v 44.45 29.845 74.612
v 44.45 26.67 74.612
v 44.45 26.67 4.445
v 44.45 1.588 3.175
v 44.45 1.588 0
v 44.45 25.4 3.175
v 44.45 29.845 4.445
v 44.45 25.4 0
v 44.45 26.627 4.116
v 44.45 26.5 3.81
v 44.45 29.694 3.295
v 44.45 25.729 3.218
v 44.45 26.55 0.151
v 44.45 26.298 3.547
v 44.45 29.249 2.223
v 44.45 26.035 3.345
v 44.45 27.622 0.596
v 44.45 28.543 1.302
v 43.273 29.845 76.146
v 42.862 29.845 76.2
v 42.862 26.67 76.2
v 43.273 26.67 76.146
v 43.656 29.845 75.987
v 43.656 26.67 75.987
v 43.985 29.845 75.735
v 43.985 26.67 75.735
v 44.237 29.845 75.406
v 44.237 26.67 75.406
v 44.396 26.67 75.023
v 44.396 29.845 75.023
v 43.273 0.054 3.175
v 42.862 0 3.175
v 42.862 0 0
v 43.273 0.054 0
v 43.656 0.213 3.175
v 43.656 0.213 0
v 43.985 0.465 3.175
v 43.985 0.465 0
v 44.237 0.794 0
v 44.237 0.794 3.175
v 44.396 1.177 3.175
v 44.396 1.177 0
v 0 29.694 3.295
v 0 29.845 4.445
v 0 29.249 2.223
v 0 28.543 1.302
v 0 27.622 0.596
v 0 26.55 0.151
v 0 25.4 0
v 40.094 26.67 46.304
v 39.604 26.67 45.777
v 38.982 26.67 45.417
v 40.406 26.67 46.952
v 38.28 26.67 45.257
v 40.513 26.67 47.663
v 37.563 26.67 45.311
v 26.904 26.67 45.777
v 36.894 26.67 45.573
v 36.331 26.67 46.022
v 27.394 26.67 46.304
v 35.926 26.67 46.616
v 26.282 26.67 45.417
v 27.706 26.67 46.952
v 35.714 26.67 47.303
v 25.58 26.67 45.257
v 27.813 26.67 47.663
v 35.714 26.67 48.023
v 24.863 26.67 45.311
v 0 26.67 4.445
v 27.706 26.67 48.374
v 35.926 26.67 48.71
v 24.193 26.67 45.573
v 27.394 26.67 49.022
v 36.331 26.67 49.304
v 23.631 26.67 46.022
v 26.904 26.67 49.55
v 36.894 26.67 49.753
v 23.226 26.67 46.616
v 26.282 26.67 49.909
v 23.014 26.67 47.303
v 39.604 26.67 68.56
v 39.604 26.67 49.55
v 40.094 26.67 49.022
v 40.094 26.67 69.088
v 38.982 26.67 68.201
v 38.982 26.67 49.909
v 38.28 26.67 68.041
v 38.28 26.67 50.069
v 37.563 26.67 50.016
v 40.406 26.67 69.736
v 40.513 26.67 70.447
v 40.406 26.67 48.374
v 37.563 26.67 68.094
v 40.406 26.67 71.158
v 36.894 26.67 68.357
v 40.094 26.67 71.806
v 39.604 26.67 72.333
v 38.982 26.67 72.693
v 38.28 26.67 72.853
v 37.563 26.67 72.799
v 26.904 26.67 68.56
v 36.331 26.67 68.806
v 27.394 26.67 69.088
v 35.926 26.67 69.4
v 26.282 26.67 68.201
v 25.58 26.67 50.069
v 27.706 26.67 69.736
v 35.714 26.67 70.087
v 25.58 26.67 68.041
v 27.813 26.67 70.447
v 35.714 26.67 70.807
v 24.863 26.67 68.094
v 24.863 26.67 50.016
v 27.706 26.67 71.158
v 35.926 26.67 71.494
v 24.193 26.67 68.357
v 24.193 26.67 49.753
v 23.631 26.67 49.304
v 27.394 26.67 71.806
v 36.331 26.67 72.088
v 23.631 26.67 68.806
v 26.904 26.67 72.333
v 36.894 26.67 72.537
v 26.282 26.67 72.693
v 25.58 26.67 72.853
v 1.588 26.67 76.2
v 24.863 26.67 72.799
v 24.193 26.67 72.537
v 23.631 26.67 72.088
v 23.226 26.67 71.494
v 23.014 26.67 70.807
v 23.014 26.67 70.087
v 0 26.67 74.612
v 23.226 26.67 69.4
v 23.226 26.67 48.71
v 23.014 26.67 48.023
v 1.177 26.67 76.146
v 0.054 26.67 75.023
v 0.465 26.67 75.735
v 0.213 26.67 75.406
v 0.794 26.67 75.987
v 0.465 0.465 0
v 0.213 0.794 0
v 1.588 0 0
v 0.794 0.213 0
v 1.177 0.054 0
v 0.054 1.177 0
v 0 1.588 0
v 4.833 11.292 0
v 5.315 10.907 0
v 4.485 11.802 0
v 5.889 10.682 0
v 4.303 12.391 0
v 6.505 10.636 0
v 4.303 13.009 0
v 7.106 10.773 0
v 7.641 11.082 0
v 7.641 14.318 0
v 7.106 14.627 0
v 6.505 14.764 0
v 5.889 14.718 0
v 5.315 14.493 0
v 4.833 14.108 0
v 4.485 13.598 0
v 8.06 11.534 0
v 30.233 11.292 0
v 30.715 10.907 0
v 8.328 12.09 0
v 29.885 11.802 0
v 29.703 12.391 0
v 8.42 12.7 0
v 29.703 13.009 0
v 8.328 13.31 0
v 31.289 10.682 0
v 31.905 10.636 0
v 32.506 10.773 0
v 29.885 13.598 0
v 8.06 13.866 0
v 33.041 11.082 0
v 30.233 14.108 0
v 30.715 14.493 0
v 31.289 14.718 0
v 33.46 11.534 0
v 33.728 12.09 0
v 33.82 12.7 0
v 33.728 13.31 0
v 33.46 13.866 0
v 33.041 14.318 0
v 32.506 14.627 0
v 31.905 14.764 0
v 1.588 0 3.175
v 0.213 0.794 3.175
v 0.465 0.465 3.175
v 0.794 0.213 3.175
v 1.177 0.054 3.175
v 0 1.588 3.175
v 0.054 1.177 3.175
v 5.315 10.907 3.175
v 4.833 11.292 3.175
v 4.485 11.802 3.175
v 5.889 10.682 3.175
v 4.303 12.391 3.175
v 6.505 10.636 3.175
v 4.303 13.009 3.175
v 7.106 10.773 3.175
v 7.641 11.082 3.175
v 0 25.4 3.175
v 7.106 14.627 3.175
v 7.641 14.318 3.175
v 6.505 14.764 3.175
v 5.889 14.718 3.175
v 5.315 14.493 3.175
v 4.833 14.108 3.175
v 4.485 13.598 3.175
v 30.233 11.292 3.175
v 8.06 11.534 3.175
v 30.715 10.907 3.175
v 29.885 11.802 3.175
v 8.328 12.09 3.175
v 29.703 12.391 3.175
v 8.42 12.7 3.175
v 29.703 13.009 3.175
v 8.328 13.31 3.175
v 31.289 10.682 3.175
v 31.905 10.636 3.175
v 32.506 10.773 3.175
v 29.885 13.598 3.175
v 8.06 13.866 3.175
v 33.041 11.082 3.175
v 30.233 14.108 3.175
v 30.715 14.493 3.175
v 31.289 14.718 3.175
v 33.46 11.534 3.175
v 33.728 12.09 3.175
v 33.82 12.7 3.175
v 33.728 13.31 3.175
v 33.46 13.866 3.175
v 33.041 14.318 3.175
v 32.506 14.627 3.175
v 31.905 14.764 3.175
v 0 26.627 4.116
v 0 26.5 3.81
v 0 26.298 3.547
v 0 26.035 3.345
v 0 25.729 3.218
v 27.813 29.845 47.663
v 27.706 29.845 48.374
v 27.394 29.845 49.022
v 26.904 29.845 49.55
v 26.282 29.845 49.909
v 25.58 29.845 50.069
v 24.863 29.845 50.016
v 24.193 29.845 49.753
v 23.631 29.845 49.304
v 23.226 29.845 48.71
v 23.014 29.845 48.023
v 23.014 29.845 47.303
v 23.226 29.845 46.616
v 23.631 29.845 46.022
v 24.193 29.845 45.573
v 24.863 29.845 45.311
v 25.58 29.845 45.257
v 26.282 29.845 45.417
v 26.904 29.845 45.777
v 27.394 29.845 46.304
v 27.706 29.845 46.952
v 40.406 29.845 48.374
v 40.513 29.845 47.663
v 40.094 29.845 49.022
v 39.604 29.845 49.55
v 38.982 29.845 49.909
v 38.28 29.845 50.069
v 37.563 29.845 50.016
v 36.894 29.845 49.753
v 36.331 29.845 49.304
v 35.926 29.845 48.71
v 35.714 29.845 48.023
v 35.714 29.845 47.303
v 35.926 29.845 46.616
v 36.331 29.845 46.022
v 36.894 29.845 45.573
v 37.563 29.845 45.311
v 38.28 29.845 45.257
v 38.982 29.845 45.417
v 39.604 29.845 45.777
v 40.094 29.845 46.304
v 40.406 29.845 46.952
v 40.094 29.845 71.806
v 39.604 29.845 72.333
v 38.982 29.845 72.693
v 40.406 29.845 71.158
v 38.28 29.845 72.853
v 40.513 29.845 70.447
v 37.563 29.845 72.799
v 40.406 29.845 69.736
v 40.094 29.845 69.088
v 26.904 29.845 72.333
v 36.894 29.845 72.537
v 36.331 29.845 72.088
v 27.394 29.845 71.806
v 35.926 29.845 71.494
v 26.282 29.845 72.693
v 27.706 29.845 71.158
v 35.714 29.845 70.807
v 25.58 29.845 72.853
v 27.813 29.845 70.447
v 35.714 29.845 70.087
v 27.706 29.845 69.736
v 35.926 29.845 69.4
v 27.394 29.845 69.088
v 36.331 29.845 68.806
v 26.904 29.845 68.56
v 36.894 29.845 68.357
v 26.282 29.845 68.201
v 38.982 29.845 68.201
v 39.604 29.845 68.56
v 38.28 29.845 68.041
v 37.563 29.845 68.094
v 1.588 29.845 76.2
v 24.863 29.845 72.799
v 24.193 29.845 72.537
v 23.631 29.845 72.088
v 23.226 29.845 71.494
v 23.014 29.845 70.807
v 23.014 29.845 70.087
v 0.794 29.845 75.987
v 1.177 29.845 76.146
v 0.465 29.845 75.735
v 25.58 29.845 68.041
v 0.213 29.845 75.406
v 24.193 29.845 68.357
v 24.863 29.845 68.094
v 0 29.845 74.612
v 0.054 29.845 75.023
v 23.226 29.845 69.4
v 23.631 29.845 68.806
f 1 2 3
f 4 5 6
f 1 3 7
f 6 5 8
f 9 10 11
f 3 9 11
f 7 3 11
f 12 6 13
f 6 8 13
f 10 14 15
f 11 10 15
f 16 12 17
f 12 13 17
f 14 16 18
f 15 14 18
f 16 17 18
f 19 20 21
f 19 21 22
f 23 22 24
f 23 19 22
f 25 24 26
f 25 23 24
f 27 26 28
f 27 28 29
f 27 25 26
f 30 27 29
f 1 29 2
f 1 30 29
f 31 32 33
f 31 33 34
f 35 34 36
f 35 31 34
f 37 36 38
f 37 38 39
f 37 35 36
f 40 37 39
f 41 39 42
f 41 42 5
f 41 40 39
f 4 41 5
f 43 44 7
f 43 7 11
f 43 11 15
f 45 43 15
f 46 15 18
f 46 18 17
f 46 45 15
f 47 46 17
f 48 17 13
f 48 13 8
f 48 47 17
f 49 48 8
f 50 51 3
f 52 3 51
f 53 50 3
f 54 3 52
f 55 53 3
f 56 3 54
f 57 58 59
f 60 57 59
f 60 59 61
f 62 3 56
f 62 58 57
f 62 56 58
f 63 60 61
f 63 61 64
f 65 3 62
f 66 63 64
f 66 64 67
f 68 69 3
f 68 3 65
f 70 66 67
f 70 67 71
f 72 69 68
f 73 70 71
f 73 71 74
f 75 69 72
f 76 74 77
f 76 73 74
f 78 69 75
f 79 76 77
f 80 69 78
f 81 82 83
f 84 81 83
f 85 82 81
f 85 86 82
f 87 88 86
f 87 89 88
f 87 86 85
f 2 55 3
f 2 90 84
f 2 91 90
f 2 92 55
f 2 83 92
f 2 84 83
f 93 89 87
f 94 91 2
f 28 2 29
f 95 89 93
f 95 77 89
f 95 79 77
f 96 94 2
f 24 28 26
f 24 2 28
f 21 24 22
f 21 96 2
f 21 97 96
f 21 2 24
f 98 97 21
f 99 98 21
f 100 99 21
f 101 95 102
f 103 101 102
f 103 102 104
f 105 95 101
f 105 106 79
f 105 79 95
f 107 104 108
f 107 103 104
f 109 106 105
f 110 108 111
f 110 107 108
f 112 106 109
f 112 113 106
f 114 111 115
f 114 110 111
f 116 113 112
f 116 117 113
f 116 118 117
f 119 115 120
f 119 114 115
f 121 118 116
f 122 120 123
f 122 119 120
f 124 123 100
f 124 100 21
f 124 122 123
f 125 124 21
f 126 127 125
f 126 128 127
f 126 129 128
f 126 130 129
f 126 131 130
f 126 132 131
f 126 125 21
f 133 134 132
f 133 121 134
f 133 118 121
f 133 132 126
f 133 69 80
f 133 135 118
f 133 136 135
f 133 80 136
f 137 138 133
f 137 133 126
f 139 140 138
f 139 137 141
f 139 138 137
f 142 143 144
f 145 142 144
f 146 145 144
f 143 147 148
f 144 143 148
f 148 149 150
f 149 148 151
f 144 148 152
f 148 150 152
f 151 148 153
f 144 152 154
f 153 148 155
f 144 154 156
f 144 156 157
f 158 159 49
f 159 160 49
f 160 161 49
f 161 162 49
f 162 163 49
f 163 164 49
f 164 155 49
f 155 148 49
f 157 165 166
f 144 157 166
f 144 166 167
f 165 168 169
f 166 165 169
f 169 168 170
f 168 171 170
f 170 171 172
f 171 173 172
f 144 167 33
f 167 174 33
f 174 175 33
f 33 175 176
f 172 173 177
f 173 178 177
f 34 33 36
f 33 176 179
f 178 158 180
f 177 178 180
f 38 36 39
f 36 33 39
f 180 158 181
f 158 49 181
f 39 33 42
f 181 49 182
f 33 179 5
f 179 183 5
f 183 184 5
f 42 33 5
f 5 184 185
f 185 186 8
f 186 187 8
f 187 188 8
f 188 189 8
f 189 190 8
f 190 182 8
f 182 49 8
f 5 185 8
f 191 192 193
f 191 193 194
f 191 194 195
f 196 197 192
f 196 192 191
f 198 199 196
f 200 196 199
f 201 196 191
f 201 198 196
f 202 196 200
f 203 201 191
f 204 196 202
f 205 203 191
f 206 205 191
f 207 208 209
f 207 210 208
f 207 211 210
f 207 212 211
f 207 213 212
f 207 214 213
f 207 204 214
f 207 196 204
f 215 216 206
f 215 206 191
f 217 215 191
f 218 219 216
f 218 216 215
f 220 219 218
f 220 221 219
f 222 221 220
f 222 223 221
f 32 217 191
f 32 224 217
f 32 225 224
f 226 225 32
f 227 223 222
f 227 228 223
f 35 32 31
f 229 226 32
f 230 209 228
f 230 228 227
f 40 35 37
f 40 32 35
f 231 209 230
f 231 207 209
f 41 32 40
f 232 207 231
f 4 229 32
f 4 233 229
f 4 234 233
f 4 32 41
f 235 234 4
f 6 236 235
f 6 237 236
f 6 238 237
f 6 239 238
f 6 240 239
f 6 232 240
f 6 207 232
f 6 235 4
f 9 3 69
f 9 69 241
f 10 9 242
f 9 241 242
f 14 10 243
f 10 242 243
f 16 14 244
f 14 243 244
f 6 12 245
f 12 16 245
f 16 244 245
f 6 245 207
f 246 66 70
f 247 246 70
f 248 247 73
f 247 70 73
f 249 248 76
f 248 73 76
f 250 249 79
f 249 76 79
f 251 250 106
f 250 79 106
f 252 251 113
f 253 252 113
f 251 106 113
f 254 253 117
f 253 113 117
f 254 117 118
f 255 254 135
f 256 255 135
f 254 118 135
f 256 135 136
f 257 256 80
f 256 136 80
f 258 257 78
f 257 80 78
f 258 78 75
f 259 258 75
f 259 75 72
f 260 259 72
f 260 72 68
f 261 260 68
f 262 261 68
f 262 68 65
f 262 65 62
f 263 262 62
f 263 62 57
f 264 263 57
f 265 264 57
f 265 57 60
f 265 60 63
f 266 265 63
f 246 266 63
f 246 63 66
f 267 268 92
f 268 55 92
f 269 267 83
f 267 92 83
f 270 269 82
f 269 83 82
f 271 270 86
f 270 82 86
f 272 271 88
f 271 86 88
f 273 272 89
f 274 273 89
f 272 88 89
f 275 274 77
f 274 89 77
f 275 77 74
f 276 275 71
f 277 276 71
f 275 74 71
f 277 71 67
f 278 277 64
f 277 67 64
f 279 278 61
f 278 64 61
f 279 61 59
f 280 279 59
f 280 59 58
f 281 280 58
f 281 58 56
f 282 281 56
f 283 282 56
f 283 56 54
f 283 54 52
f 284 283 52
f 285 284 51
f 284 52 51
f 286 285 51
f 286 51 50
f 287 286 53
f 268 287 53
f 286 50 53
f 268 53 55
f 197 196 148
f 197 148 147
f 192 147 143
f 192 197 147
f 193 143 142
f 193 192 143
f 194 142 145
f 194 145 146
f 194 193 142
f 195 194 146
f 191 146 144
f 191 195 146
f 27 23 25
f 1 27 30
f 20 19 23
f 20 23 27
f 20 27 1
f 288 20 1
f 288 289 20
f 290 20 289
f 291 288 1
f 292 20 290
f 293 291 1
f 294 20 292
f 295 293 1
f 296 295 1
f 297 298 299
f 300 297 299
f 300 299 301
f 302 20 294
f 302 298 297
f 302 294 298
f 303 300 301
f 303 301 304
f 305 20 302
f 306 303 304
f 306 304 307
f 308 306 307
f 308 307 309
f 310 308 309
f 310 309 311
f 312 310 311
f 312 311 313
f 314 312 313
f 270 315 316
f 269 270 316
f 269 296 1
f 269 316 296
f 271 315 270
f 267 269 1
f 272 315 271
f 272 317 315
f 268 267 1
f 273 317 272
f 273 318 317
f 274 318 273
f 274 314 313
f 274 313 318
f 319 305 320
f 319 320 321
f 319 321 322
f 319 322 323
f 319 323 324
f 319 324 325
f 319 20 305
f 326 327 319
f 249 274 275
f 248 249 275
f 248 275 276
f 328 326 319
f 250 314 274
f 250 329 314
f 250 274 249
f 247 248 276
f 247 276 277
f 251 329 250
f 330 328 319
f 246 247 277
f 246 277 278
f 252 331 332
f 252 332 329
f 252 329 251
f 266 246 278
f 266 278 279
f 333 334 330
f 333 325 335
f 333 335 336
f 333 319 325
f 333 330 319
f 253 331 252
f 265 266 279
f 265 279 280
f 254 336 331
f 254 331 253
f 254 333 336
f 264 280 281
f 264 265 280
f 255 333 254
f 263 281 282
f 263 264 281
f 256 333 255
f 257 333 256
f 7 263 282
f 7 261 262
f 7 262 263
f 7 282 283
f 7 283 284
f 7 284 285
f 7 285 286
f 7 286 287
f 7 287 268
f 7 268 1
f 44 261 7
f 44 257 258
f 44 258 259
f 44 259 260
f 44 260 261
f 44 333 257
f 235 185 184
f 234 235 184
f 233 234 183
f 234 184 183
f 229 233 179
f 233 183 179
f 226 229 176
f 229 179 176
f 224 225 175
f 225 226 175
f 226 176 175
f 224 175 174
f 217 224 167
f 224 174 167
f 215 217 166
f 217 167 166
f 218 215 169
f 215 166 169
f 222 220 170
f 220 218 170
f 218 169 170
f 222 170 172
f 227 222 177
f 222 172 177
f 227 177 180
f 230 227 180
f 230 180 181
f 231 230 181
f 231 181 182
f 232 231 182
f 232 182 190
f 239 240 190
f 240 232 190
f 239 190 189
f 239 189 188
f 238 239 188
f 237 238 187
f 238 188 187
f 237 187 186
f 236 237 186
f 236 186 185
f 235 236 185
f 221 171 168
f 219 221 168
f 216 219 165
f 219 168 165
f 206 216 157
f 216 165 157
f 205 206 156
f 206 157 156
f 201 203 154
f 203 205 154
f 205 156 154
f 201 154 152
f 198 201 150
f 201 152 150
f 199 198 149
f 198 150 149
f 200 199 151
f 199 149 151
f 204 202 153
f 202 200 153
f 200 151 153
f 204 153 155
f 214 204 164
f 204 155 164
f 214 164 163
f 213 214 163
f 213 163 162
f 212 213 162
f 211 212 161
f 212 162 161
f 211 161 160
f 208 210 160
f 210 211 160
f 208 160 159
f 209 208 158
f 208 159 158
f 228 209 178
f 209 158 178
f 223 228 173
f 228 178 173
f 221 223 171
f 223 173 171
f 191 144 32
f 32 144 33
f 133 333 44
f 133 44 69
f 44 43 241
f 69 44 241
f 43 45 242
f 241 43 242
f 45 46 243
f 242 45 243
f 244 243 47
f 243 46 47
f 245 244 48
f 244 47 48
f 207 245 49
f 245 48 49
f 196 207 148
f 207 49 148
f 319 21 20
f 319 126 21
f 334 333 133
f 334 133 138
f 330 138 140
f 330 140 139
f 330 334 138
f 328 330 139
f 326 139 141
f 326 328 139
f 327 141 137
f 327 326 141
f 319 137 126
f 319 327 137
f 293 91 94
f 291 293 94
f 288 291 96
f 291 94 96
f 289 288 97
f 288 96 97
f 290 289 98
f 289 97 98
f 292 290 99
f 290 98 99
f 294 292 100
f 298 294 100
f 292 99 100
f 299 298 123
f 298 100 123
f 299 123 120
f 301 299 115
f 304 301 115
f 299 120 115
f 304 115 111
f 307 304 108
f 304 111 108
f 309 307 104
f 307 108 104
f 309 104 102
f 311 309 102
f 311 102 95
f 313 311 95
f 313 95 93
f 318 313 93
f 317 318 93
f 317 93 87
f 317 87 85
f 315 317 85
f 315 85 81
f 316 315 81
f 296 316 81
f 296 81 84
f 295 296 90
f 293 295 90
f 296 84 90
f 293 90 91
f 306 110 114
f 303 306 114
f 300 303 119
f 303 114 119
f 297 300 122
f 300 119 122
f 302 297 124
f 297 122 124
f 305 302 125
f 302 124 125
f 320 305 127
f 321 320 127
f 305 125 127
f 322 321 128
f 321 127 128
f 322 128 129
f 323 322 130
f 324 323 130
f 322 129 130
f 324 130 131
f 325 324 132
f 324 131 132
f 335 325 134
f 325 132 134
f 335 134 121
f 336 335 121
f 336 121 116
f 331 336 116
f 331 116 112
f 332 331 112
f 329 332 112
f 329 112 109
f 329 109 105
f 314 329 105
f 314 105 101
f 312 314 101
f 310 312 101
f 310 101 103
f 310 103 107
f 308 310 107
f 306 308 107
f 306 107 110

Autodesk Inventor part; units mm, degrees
ref_plane "YZ Plane" through (0, 0, 0) normal (1, 0, 0) x (0, 1, 0)
ref_plane "XZ Plane" through (0, 0, 0) normal (0, 1, 0) x (-1, 0, 0)
ref_plane "XY Plane" through (0, 0, 0) normal (0, 0, 1) x (1, 0, 0)
sketch "Sketch1" plane through (0, 0, 0) normal (0, 0, 1) x (1, 0, 0)
  line L0 (0, 0) -> (44.45, 0)
  line L1 (44.45, 0) -> (44.45, 25.4)
  line L2 (44.45, 25.4) -> (0, 25.4)
  line L3 (0, 25.4) -> (0, 0)
  circle A0 centre (6.35, 12.7) radius 2.0701
  line L4 (0, 12.7) -> (44.45, 12.7) construction
  circle A1 centre (31.75, 12.7) radius 2.0701
  dimension "d0" = 44.45
  dimension "d1" = 25.4
  dimension "d2" = 4.1402
  dimension "d6" = 25.4
  dimension "d34" = 6.35
extrude "Plate1" add sketch "Sketch1" along normal blind 3.175
sketch "Sketch2" plane through (0, 26.67, 4.445) normal (0, 1, 0) x (-1, 0, 0)
  line L0 (-44.45, 0) -> (0, 0)
  line L1 (0, 0) -> (0, 71.755)
  line L2 (0, 71.755) -> (-44.45, 71.755)
  line L3 (-44.45, 71.755) -> (-44.45, 0)
edge flange "Flange1" height 76.2 angle 90 thickness 3.175 bend radius 1.27 thickness toward (0, 1, 0) relief tear relief width 3.175 relief depth 1.5875 edges at (22.225, 25.4, 3.175) wall of the first edge with corners at (44.45, 26.67, 4.445) (0, 26.67, 4.445) (0, 26.67, 76.2) (44.45, 26.67, 76.2)
bend "Bend1"
corner "Corner1"
fillet "Fillet1" radius 1.5875 4 edges at (44.45, 0, 1.5875) (0, 0, 1.5875) (44.45, 28.2575, 76.2) (0, 28.2575, 76.2)
sketch "Sketch3" plane through (0, 26.67, 4.445) normal (0, -1, 0) x (1, 0, 0)
  line L0 (22.225, 71.755) -> (41.275, 71.755) construction
  line L1 (41.275, 71.755) -> (41.275, 37.465) construction
  line L2 (41.275, 37.465) -> (22.225, 37.465) construction
  line L3 (22.225, 37.465) -> (22.225, 71.755) construction
  circle A0 centre (38.1, 66.0019) radius 2.413
  line L4 (31.75, 71.755) -> (31.75, 37.465) construction
  line L5 (22.225, 54.61) -> (41.275, 54.61) construction
  circle A1 centre (25.4, 66.0019) radius 2.413
  circle A2 centre (38.1, 43.2181) radius 2.413
  circle A3 centre (25.4, 43.2181) radius 2.413
  line L6 (0, 70.1675) -> (0, 0) projected
  line L7 (42.8625, 71.755) -> (1.5875, 71.755) projected
  point P0 (0, -4.445)
  dimension "d23" = 34.29
  dimension "d24" = 19.05
  dimension "d27" = 4.826
  dimension "d28" = 3.175
  dimension "d29" = 5.7531
  dimension "d35" = 22.225
extrude "Extrusion1" cut sketch "Sketch3" against normal blind 25.4
equation "\"d12\" = BendReliefWidth"
equation "\"d13\" = BendReliefDepth"
equation "\"d14\" = MinimumRemnant"
equation "\"d15\" = BendRadius"
equation "\"d19\" = CornerReliefSize"
equation "\"d20\" = GapSize"
equation "\"d21\" = JacobiRadiusSize"
equation "\"BendRadius\" = Thickness"
equation "\"BendReliefWidth\" = Thickness"
equation "\"BendReliefDepth\" = 0.5 * Thickness"
equation "\"CornerReliefSize\" = 4 * Thickness"
equation "\"MinimumRemnant\" = 2 * Thickness"
equation "\"TransitionRadius\" = BendRadius"
equation "\"JacobiRadiusSize\" = BendRadius"
equation "\"GapSize\" = Thickness"
equation "\"d11\" = BendRadius"
equation "\"Thickness\" = 3.175"
properties part number "Pneumatic Piston Back Flange (Lt Custom)"
